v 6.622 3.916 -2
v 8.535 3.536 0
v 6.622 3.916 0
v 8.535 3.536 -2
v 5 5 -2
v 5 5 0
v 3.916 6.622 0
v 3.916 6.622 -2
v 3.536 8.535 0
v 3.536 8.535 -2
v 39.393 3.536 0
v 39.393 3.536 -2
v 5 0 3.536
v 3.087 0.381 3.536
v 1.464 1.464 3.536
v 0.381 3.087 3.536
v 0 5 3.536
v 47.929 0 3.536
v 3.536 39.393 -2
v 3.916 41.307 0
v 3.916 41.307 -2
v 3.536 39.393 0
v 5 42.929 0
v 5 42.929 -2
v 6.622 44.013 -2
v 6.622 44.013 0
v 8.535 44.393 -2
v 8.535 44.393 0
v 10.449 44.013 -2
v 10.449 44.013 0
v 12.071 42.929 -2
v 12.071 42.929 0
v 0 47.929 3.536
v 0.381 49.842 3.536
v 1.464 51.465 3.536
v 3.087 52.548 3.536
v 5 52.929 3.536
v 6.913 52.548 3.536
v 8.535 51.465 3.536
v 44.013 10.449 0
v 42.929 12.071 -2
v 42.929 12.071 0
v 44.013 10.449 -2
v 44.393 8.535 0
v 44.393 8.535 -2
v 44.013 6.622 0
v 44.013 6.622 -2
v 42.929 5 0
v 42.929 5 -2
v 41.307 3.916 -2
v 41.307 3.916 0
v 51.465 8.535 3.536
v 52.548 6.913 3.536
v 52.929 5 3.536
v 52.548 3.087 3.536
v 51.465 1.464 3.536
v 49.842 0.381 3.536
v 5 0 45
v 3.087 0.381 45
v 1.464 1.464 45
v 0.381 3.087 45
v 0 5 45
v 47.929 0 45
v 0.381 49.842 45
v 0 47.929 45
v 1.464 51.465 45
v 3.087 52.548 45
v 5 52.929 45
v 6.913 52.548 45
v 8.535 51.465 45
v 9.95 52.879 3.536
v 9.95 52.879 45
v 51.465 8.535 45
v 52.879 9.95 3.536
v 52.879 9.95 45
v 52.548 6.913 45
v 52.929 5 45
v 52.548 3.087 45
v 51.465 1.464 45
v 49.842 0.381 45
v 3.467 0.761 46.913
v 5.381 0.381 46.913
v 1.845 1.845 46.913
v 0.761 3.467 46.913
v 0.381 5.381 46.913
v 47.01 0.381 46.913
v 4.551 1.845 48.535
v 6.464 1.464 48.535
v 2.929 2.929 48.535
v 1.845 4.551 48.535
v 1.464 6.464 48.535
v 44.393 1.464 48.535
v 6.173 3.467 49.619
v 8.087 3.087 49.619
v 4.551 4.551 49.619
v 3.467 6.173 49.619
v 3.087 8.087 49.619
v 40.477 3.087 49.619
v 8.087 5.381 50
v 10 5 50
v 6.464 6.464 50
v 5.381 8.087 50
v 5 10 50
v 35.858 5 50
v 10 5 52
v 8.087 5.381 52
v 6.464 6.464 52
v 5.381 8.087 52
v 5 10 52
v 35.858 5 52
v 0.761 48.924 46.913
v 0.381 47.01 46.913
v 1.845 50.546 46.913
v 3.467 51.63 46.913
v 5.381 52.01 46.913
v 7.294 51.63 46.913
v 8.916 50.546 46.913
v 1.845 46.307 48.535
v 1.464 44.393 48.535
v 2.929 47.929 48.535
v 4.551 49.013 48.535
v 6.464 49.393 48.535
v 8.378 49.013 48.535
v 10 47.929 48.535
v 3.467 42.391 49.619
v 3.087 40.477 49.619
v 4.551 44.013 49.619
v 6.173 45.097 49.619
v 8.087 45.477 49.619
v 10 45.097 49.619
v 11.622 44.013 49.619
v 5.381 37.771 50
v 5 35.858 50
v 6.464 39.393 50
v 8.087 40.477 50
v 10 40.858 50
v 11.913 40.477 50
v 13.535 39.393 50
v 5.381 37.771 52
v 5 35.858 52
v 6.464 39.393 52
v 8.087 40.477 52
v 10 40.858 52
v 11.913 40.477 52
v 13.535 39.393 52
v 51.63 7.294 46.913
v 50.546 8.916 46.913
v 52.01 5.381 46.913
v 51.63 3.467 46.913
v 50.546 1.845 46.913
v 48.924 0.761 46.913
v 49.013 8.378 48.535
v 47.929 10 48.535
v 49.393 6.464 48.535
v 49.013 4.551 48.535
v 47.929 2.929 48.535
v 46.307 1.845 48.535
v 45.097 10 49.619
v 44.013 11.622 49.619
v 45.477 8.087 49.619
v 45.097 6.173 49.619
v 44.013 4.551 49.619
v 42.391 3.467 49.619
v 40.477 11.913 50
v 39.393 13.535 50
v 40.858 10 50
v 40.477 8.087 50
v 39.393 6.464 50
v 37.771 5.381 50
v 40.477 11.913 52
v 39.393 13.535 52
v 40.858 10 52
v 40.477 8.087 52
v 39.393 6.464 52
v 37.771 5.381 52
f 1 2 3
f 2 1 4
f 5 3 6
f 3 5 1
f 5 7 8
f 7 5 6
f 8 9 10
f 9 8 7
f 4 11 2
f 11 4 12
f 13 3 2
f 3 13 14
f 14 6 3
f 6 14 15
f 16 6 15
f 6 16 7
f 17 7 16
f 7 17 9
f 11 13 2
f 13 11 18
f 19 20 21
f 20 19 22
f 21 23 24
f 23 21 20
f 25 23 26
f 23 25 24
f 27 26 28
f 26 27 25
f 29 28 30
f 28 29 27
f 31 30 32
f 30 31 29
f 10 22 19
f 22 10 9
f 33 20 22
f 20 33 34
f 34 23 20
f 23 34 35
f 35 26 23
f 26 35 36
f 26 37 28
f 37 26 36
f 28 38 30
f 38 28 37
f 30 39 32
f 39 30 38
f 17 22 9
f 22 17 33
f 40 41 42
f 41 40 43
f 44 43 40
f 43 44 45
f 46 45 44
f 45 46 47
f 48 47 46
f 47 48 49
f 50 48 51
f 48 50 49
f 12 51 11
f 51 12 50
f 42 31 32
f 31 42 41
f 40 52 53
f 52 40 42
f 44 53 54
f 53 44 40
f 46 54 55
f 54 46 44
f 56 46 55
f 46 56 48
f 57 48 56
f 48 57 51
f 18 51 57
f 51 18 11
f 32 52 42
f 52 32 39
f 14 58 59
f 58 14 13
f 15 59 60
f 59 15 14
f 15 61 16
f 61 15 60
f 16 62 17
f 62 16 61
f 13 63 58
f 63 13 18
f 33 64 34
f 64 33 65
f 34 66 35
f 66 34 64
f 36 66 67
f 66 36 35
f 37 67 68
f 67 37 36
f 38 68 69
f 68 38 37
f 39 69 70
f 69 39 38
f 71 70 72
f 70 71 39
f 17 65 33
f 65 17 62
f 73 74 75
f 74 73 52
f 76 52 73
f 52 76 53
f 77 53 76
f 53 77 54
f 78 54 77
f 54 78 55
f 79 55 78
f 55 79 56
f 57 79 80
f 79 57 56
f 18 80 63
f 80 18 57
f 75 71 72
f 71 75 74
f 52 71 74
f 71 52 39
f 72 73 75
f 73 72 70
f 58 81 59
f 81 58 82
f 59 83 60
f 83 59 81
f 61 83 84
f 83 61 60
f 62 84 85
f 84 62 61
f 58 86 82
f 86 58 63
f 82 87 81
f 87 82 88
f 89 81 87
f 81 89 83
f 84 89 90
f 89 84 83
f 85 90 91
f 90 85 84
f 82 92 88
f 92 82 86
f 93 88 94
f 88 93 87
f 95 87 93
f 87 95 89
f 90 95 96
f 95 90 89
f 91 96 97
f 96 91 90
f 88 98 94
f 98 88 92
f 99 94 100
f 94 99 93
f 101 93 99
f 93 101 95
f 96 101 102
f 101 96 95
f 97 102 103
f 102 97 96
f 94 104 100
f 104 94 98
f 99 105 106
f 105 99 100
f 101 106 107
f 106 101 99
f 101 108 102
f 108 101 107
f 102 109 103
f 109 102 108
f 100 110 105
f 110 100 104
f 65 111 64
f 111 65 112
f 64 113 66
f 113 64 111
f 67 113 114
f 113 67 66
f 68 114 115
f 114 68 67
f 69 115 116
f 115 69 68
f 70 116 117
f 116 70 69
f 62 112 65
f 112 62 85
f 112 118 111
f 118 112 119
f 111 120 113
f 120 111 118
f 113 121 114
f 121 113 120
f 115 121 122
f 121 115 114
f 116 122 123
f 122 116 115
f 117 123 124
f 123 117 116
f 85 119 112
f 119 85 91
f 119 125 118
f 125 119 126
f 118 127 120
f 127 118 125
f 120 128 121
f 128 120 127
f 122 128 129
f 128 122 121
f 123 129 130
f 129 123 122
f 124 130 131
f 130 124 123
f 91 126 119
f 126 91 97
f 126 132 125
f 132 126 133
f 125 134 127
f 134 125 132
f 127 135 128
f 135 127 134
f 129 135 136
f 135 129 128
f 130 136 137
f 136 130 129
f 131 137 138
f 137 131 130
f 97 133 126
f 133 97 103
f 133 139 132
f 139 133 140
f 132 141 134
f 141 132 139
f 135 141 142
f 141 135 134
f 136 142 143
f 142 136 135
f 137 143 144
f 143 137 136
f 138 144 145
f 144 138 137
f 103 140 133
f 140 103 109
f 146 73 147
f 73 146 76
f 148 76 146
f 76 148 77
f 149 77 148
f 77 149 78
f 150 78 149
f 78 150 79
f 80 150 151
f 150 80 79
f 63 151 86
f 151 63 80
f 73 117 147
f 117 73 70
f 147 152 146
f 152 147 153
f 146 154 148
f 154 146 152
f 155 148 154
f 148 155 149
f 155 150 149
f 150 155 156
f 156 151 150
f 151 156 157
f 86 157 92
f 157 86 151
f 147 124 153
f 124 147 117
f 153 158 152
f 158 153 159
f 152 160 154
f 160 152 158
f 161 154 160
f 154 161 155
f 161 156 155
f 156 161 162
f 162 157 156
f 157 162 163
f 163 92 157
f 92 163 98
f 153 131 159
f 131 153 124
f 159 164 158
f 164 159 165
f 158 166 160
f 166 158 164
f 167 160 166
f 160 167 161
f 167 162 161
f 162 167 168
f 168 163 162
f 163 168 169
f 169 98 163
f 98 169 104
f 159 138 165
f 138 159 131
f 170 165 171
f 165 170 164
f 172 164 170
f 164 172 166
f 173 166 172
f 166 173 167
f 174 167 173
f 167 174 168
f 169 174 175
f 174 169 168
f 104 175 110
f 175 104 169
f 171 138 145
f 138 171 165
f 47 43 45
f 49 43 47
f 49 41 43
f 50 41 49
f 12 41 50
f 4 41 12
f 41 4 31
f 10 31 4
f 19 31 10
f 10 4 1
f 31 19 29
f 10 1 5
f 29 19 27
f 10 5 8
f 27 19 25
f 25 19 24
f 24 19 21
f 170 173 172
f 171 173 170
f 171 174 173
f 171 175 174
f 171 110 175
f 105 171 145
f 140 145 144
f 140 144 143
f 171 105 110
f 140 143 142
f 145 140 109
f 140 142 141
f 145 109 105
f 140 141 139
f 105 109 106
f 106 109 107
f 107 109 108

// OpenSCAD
// Unit of length: Unit.MM
polyhedron(points = [[8.5355, 3.5355, -2.0], [8.5355, 3.5355, 0.0], [8.5355, 3.5355, 0.0], [8.5355, 3.5355, -2.0], [6.6221, 3.9161, -2.0], [6.6221, 3.9161, 0.0], [5.0, 5.0, -2.0], [5.0, 5.0, 0.0], [3.9161, 6.6221, -2.0], [3.9161, 6.6221, 0.0], [3.5355, 8.5355, -2.0], [3.5355, 8.5355, 0.0], [3.5355, 8.5355, -2.0], [3.5355, 8.5355, 0.0], [39.3934, 3.5355, 0.0], [39.3934, 3.5355, -2.0], [5.0, 0.0, 3.5355], [5.0, 0.0, 3.5355], [3.0866, 0.3806, 3.5355], [1.4645, 1.4645, 3.5355], [0.3806, 3.0866, 3.5355], [0.0, 5.0, 3.5355], [0.0, 5.0, 3.5355], [47.9289, 0.0, 3.5355], [3.5355, 39.3934, -2.0], [3.5355, 39.3934, 0.0], [3.5355, 39.3934, 0.0], [3.5355, 39.3934, -2.0], [3.9161, 41.3068, -2.0], [3.9161, 41.3068, 0.0], [5.0, 42.9289, -2.0], [5.0, 42.9289, 0.0], [6.6221, 44.0128, -2.0], [6.6221, 44.0128, 0.0], [8.5355, 44.3934, -2.0], [8.5355, 44.3934, 0.0], [10.449, 44.0128, -2.0], [10.449, 44.0128, 0.0], [12.0711, 42.9289, -2.0], [12.0711, 42.9289, 0.0], [12.0711, 42.9289, -2.0], [12.0711, 42.9289, 0.0], [0.0, 47.9289, 3.5355], [0.0, 47.9289, 3.5355], [0.3806, 49.8423, 3.5355], [1.4645, 51.4645, 3.5355], [3.0866, 52.5483, 3.5355], [5.0, 52.9289, 3.5355], [6.9134, 52.5483, 3.5355], [8.5355, 51.4645, 3.5355], [8.5355, 51.4645, 3.5355], [42.9289, 12.0711, -2.0], [42.9289, 12.0711, 0.0], [42.9289, 12.0711, 0.0], [42.9289, 12.0711, -2.0], [44.0128, 10.449, -2.0], [44.0128, 10.449, 0.0], [44.3934, 8.5355, -2.0], [44.3934, 8.5355, 0.0], [44.0128, 6.6221, -2.0], [44.0128, 6.6221, 0.0], [42.9289, 5.0, -2.0], [42.9289, 5.0, 0.0], [41.3068, 3.9161, -2.0], [41.3068, 3.9161, 0.0], [39.3934, 3.5355, -2.0], [39.3934, 3.5355, 0.0], [51.4645, 8.5355, 3.5355], [51.4645, 8.5355, 3.5355], [52.5483, 6.9134, 3.5355], [52.9289, 5.0, 3.5355], [52.5483, 3.0866, 3.5355], [51.4645, 1.4645, 3.5355], [49.8423, 0.3806, 3.5355], [47.9289, 0.0, 3.5355], [5.0, 0.0, 45.0], [5.0, 0.0, 45.0], [3.0866, 0.3806, 45.0], [1.4645, 1.4645, 45.0], [0.3806, 3.0866, 45.0], [0.0, 5.0, 45.0], [0.0, 5.0, 45.0], [47.9289, 0.0, 45.0], [0.0, 47.9289, 45.0], [0.0, 47.9289, 45.0], [0.3806, 49.8423, 45.0], [1.4645, 51.4645, 45.0], [3.0866, 52.5483, 45.0], [5.0, 52.9289, 45.0], [6.9134, 52.5483, 45.0], [8.5355, 51.4645, 45.0], [8.5355, 51.4645, 45.0], [9.9497, 52.8787, 3.5355], [9.9497, 52.8787, 45.0], [51.4645, 8.5355, 45.0], [52.8787, 9.9497, 45.0], [52.8787, 9.9497, 3.5355], [51.4645, 8.5355, 45.0], [52.5483, 6.9134, 45.0], [52.9289, 5.0, 45.0], [52.5483, 3.0866, 45.0], [51.4645, 1.4645, 45.0], [49.8423, 0.3806, 45.0], [47.9289, 0.0, 45.0], [5.0, 0.0, 45.0], [5.0, 0.0, 45.0], [3.0866, 0.3806, 45.0], [1.4645, 1.4645, 45.0], [0.3806, 3.0866, 45.0], [0.0, 5.0, 45.0], [0.0, 5.0, 45.0], [47.9289, 0.0, 45.0], [5.3806, 0.3806, 46.9134], [5.3806, 0.3806, 46.9134], [3.4672, 0.7612, 46.9134], [1.8451, 1.8451, 46.9134], [0.7612, 3.4672, 46.9134], [0.3806, 5.3806, 46.9134], [0.3806, 5.3806, 46.9134], [47.0101, 0.3806, 46.9134], [6.4645, 1.4645, 48.5355], [6.4645, 1.4645, 48.5355], [4.551, 1.8451, 48.5355], [2.9289, 2.9289, 48.5355], [1.8451, 4.551, 48.5355], [1.4645, 6.4645, 48.5355], [1.4645, 6.4645, 48.5355], [44.3934, 1.4645, 48.5355], [8.0866, 3.0866, 49.6194], [8.0866, 3.0866, 49.6194], [6.1732, 3.4672, 49.6194], [4.551, 4.551, 49.6194], [3.4672, 6.1732, 49.6194], [3.0866, 8.0866, 49.6194], [3.0866, 8.0866, 49.6194], [40.4773, 3.0866, 49.6194], [10.0, 5.0, 50.0], [10.0, 5.0, 50.0], [8.0866, 5.3806, 50.0], [6.4645, 6.4645, 50.0], [5.3806, 8.0866, 50.0], [5.0, 10.0, 50.0], [5.0, 10.0, 50.0], [35.8579, 5.0, 50.0], [10.0, 5.0, 50.0], [10.0, 5.0, 50.0], [8.0866, 5.3806, 50.0], [6.4645, 6.4645, 50.0], [5.3806, 8.0866, 50.0], [5.0, 10.0, 50.0], [5.0, 10.0, 50.0], [35.8579, 5.0, 50.0], [10.0, 5.0, 52.0], [10.0, 5.0, 52.0], [8.0866, 5.3806, 52.0], [6.4645, 6.4645, 52.0], [5.3806, 8.0866, 52.0], [5.0, 10.0, 52.0], [5.0, 10.0, 52.0], [35.8579, 5.0, 52.0], [0.0, 47.9289, 45.0], [0.0, 47.9289, 45.0], [0.3806, 49.8423, 45.0], [1.4645, 51.4645, 45.0], [3.0866, 52.5483, 45.0], [5.0, 52.9289, 45.0], [6.9134, 52.5483, 45.0], [8.5355, 51.4645, 45.0], [8.5355, 51.4645, 45.0], [0.3806, 47.0101, 46.9134], [0.3806, 47.0101, 46.9134], [0.7612, 48.9235, 46.9134], [1.8451, 50.5456, 46.9134], [3.4672, 51.6295, 46.9134], [5.3806, 52.0101, 46.9134], [7.294, 51.6295, 46.9134], [8.9161, 50.5456, 46.9134], [8.9161, 50.5456, 46.9134], [1.4645, 44.3934, 48.5355], [1.4645, 44.3934, 48.5355], [1.8451, 46.3068, 48.5355], [2.9289, 47.9289, 48.5355], [4.551, 49.0128, 48.5355], [6.4645, 49.3934, 48.5355], [8.3779, 49.0128, 48.5355], [10.0, 47.9289, 48.5355], [10.0, 47.9289, 48.5355], [3.0866, 40.4773, 49.6194], [3.0866, 40.4773, 49.6194], [3.4672, 42.3907, 49.6194], [4.551, 44.0128, 49.6194], [6.1732, 45.0967, 49.6194], [8.0866, 45.4773, 49.6194], [10.0, 45.0967, 49.6194], [11.6221, 44.0128, 49.6194], [11.6221, 44.0128, 49.6194], [5.0, 35.8579, 50.0], [5.0, 35.8579, 50.0], [5.3806, 37.7713, 50.0], [6.4645, 39.3934, 50.0], [8.0866, 40.4773, 50.0], [10.0, 40.8579, 50.0], [11.9134, 40.4773, 50.0], [13.5355, 39.3934, 50.0], [13.5355, 39.3934, 50.0], [5.0, 35.8579, 50.0], [5.0, 35.8579, 50.0], [5.3806, 37.7713, 50.0], [6.4645, 39.3934, 50.0], [8.0866, 40.4773, 50.0], [10.0, 40.8579, 50.0], [11.9134, 40.4773, 50.0], [13.5355, 39.3934, 50.0], [13.5355, 39.3934, 50.0], [5.0, 35.8579, 52.0], [5.0, 35.8579, 52.0], [5.3806, 37.7713, 52.0], [6.4645, 39.3934, 52.0], [8.0866, 40.4773, 52.0], [10.0, 40.8579, 52.0], [11.9134, 40.4773, 52.0], [13.5355, 39.3934, 52.0], [13.5355, 39.3934, 52.0], [51.4645, 8.5355, 45.0], [51.4645, 8.5355, 45.0], [52.5483, 6.9134, 45.0], [52.9289, 5.0, 45.0], [52.5483, 3.0866, 45.0], [51.4645, 1.4645, 45.0], [49.8423, 0.3806, 45.0], [47.9289, 0.0, 45.0], [50.5456, 8.9161, 46.9134], [50.5456, 8.9161, 46.9134], [51.6295, 7.294, 46.9134], [52.0101, 5.3806, 46.9134], [51.6295, 3.4672, 46.9134], [50.5456, 1.8451, 46.9134], [48.9235, 0.7612, 46.9134], [47.0101, 0.3806, 46.9134], [47.9289, 10.0, 48.5355], [47.9289, 10.0, 48.5355], [49.0128, 8.3779, 48.5355], [49.3934, 6.4645, 48.5355], [49.0128, 4.551, 48.5355], [47.9289, 2.9289, 48.5355], [46.3068, 1.8451, 48.5355], [44.3934, 1.4645, 48.5355], [44.0128, 11.6221, 49.6194], [44.0128, 11.6221, 49.6194], [45.0967, 10.0, 49.6194], [45.4773, 8.0866, 49.6194], [45.0967, 6.1732, 49.6194], [44.0128, 4.551, 49.6194], [42.3907, 3.4672, 49.6194], [40.4773, 3.0866, 49.6194], [39.3934, 13.5355, 50.0], [39.3934, 13.5355, 50.0], [40.4773, 11.9134, 50.0], [40.8579, 10.0, 50.0], [40.4773, 8.0866, 50.0], [39.3934, 6.4645, 50.0], [37.7713, 5.3806, 50.0], [35.8579, 5.0, 50.0], [39.3934, 13.5355, 50.0], [39.3934, 13.5355, 50.0], [40.4773, 11.9134, 50.0], [40.8579, 10.0, 50.0], [40.4773, 8.0866, 50.0], [39.3934, 6.4645, 50.0], [37.7713, 5.3806, 50.0], [35.8579, 5.0, 50.0], [39.3934, 13.5355, 52.0], [39.3934, 13.5355, 52.0], [40.4773, 11.9134, 52.0], [40.8579, 10.0, 52.0], [40.4773, 8.0866, 52.0], [39.3934, 6.4645, 52.0], [37.7713, 5.3806, 52.0], [35.8579, 5.0, 52.0]], faces = [[0, 1, 2, 3], [4, 5, 1, 0], [6, 7, 5, 4], [8, 9, 7, 6], [10, 11, 9, 8], [12, 13, 11, 10], [3, 2, 14, 15], [1, 16, 17, 2], [5, 18, 16, 1], [7, 19, 18, 5], [9, 20, 19, 7], [11, 21, 20, 9], [13, 22, 21, 11], [2, 17, 23, 14], [24, 25, 26, 27], [28, 29, 25, 24], [30, 31, 29, 28], [32, 33, 31, 30], [34, 35, 33, 32], [36, 37, 35, 34], [38, 39, 37, 36], [40, 41, 39, 38], [27, 26, 13, 12], [25, 42, 43, 26], [29, 44, 42, 25], [31, 45, 44, 29], [33, 46, 45, 31], [35, 47, 46, 33], [37, 48, 47, 35], [39, 49, 48, 37], [41, 50, 49, 39], [26, 43, 22, 13], [51, 52, 53, 54], [55, 56, 52, 51], [57, 58, 56, 55], [59, 60, 58, 57], [61, 62, 60, 59], [63, 64, 62, 61], [65, 66, 64, 63], [15, 14, 66, 65], [54, 53, 41, 40], [52, 67, 68, 53], [56, 69, 67, 52], [58, 70, 69, 56], [60, 71, 70, 58], [62, 72, 71, 60], [64, 73, 72, 62], [66, 74, 73, 64], [14, 23, 74, 66], [53, 68, 50, 41], [16, 75, 76, 17], [18, 77, 75, 16], [19, 78, 77, 18], [20, 79, 78, 19], [21, 80, 79, 20], [22, 81, 80, 21], [17, 76, 82, 23], [42, 83, 84, 43], [44, 85, 83, 42], [45, 86, 85, 44], [46, 87, 86, 45], [47, 88, 87, 46], [48, 89, 88, 47], [49, 90, 89, 48], [50, 91, 90, 49], [92, 93, 91, 50], [43, 84, 81, 22], [68, 94, 95, 96], [67, 97, 94, 68], [69, 98, 97, 67], [70, 99, 98, 69], [71, 100, 99, 70], [72, 101, 100, 71], [73, 102, 101, 72], [74, 103, 102, 73], [23, 82, 103, 74], [96, 95, 93, 92], [92, 50, 68, 96], [91, 93, 95, 94], [75, 104, 105, 76], [77, 106, 104, 75], [78, 107, 106, 77], [79, 108, 107, 78], [80, 109, 108, 79], [81, 110, 109, 80], [76, 105, 111, 82], [104, 112, 113, 105], [106, 114, 112, 104], [107, 115, 114, 106], [108, 116, 115, 107], [109, 117, 116, 108], [110, 118, 117, 109], [105, 113, 119, 111], [112, 120, 121, 113], [114, 122, 120, 112], [115, 123, 122, 114], [116, 124, 123, 115], [117, 125, 124, 116], [118, 126, 125, 117], [113, 121, 127, 119], [120, 128, 129, 121], [122, 130, 128, 120], [123, 131, 130, 122], [124, 132, 131, 123], [125, 133, 132, 124], [126, 134, 133, 125], [121, 129, 135, 127], [128, 136, 137, 129], [130, 138, 136, 128], [131, 139, 138, 130], [132, 140, 139, 131], [133, 141, 140, 132], [134, 142, 141, 133], [129, 137, 143, 135], [136, 144, 145, 137], [138, 146, 144, 136], [139, 147, 146, 138], [140, 148, 147, 139], [141, 149, 148, 140], [142, 150, 149, 141], [137, 145, 151, 143], [144, 152, 153, 145], [146, 154, 152, 144], [147, 155, 154, 146], [148, 156, 155, 147], [149, 157, 156, 148], [150, 158, 157, 149], [145, 153, 159, 151], [83, 160, 161, 84], [85, 162, 160, 83], [86, 163, 162, 85], [87, 164, 163, 86], [88, 165, 164, 87], [89, 166, 165, 88], [90, 167, 166, 89], [91, 168, 167, 90], [84, 161, 110, 81], [160, 169, 170, 161], [162, 171, 169, 160], [163, 172, 171, 162], [164, 173, 172, 163], [165, 174, 173, 164], [166, 175, 174, 165], [167, 176, 175, 166], [168, 177, 176, 167], [161, 170, 118, 110], [169, 178, 179, 170], [171, 180, 178, 169], [172, 181, 180, 171], [173, 182, 181, 172], [174, 183, 182, 173], [175, 184, 183, 174], [176, 185, 184, 175], [177, 186, 185, 176], [170, 179, 126, 118], [178, 187, 188, 179], [180, 189, 187, 178], [181, 190, 189, 180], [182, 191, 190, 181], [183, 192, 191, 182], [184, 193, 192, 183], [185, 194, 193, 184], [186, 195, 194, 185], [179, 188, 134, 126], [187, 196, 197, 188], [189, 198, 196, 187], [190, 199, 198, 189], [191, 200, 199, 190], [192, 201, 200, 191], [193, 202, 201, 192], [194, 203, 202, 193], [195, 204, 203, 194], [188, 197, 142, 134], [196, 205, 206, 197], [198, 207, 205, 196], [199, 208, 207, 198], [200, 209, 208, 199], [201, 210, 209, 200], [202, 211, 210, 201], [203, 212, 211, 202], [204, 213, 212, 203], [197, 206, 150, 142], [205, 214, 215, 206], [207, 216, 214, 205], [208, 217, 216, 207], [209, 218, 217, 208], [210, 219, 218, 209], [211, 220, 219, 210], [212, 221, 220, 211], [213, 222, 221, 212], [206, 215, 158, 150], [97, 223, 224, 94], [98, 225, 223, 97], [99, 226, 225, 98], [100, 227, 226, 99], [101, 228, 227, 100], [102, 229, 228, 101], [103, 230, 229, 102], [82, 111, 230, 103], [94, 224, 168, 91], [223, 231, 232, 224], [225, 233, 231, 223], [226, 234, 233, 225], [227, 235, 234, 226], [228, 236, 235, 227], [229, 237, 236, 228], [230, 238, 237, 229], [111, 119, 238, 230], [224, 232, 177, 168], [231, 239, 240, 232], [233, 241, 239, 231], [234, 242, 241, 233], [235, 243, 242, 234], [236, 244, 243, 235], [237, 245, 244, 236], [238, 246, 245, 237], [119, 127, 246, 238], [232, 240, 186, 177], [239, 247, 248, 240], [241, 249, 247, 239], [242, 250, 249, 241], [243, 251, 250, 242], [244, 252, 251, 243], [245, 253, 252, 244], [246, 254, 253, 245], [127, 135, 254, 246], [240, 248, 195, 186], [247, 255, 256, 248], [249, 257, 255, 247], [250, 258, 257, 249], [251, 259, 258, 250], [252, 260, 259, 251], [253, 261, 260, 252], [254, 262, 261, 253], [135, 143, 262, 254], [248, 256, 204, 195], [255, 263, 264, 256], [257, 265, 263, 255], [258, 266, 265, 257], [259, 267, 266, 258], [260, 268, 267, 259], [261, 269, 268, 260], [262, 270, 269, 261], [143, 151, 270, 262], [256, 264, 213, 204], [263, 271, 272, 264], [265, 273, 271, 263], [266, 274, 273, 265], [267, 275, 274, 266], [268, 276, 275, 267], [269, 277, 276, 268], [270, 278, 277, 269], [151, 159, 278, 270], [264, 272, 222, 213], [15, 65, 63, 61, 59, 57, 55, 51, 54, 40, 38, 36, 34, 32, 30, 28, 24, 27, 12, 10, 8, 6, 4, 0, 3], [153, 152, 154, 155, 156, 157, 158, 215, 214, 216, 217, 218, 219, 220, 221, 222, 272, 271, 273, 274, 275, 276, 277, 278, 159]]);
